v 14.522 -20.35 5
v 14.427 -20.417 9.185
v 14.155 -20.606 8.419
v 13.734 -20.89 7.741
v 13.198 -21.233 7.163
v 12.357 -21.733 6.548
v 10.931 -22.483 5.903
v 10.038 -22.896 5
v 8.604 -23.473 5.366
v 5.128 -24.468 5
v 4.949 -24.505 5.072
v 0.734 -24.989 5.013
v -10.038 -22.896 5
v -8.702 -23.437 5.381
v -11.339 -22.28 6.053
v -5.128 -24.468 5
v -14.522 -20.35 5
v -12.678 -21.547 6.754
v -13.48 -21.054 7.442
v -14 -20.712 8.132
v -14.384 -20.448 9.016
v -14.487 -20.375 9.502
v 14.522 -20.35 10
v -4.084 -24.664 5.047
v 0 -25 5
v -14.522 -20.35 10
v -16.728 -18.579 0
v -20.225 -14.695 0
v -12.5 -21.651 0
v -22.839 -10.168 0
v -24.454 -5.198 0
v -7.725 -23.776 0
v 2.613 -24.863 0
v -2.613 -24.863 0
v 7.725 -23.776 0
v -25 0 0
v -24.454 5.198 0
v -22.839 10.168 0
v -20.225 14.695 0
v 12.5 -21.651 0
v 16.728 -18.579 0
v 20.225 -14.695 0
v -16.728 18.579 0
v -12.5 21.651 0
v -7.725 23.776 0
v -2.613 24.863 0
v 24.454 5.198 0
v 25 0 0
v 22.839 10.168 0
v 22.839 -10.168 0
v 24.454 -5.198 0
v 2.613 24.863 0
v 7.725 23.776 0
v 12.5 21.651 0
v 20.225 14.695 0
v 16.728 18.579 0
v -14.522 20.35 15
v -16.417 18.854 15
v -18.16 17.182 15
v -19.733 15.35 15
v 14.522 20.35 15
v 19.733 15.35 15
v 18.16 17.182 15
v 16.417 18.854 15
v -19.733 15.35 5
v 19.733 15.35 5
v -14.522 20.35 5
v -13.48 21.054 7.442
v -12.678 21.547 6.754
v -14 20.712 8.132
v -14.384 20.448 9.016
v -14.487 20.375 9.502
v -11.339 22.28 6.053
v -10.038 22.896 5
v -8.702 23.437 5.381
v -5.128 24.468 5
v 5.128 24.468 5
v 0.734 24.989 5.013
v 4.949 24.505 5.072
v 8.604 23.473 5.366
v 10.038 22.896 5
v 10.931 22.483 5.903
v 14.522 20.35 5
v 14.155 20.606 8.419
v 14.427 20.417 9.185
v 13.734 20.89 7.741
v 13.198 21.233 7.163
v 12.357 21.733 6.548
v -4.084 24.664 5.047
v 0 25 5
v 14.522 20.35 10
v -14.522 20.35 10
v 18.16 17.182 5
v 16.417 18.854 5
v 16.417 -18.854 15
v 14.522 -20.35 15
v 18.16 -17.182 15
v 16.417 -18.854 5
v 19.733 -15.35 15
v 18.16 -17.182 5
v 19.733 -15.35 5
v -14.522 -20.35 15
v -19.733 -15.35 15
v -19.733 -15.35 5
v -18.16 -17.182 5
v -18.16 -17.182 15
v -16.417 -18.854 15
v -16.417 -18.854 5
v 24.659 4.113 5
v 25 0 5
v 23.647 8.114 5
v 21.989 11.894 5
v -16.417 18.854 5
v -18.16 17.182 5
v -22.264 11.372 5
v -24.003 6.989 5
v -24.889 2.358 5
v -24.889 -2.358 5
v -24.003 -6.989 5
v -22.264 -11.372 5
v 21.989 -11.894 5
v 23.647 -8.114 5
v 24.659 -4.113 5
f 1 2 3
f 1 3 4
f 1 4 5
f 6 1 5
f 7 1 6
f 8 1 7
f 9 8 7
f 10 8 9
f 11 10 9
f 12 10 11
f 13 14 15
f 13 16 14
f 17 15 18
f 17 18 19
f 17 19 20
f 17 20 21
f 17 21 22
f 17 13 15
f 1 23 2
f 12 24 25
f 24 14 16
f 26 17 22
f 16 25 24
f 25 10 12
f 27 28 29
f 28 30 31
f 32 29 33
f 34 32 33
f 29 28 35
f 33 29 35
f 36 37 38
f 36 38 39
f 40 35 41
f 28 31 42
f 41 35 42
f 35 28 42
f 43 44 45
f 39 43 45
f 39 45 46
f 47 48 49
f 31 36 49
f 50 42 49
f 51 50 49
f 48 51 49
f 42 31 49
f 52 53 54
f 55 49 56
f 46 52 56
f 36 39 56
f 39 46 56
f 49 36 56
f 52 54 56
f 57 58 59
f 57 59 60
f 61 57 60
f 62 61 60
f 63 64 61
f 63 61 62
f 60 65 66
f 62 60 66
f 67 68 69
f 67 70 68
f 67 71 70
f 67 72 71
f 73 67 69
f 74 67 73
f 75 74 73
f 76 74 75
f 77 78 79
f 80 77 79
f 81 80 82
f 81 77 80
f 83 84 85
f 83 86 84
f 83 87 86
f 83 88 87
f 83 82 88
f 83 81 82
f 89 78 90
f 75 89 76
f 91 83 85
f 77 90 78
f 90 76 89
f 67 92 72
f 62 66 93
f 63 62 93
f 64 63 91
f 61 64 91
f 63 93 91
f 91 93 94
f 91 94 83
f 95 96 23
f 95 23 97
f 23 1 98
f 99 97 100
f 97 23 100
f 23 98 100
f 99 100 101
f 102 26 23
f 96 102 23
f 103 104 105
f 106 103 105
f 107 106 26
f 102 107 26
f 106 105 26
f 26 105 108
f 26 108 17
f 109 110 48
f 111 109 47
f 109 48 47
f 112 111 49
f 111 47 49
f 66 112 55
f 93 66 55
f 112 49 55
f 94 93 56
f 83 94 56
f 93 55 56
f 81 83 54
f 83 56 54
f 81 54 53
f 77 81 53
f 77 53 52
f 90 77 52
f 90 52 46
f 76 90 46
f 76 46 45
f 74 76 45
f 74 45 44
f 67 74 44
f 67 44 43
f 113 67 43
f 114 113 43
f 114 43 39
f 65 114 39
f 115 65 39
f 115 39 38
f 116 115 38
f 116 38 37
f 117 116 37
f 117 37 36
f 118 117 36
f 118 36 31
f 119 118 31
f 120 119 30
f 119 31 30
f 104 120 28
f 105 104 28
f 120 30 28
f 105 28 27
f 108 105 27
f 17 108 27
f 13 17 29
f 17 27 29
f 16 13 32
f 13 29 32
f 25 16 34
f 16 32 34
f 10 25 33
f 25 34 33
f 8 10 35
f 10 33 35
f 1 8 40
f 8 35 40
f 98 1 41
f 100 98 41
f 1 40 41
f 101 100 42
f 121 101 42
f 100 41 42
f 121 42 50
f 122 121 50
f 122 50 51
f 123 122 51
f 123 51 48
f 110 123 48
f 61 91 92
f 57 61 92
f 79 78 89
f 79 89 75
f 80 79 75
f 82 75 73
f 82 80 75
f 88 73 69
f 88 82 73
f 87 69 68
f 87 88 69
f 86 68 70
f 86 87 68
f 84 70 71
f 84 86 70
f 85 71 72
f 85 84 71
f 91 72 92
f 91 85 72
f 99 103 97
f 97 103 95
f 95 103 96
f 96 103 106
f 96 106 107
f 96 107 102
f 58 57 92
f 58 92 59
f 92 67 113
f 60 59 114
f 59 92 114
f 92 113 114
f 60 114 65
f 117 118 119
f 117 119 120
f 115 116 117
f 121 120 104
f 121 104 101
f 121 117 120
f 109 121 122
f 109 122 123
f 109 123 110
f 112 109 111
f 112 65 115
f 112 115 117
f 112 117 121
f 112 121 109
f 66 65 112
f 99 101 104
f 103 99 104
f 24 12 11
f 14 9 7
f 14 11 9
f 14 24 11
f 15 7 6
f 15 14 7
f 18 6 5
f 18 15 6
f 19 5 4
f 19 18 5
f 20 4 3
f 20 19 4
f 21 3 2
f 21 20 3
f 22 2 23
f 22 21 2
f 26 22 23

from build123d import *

# Parameters (mm, degrees)
ESQUISSE1_R        = 25
BOSS_EXTRU_1_DEPTH = 5
BOSS_EXTRU_2_DEPTH = 10
CONG_2_R           = 5


with BuildPart() as part:
    # Esquisse1 → Boss.-Extru.1 (new body)
    with BuildSketch(Plane.XY):
        Circle(ESQUISSE1_R)
    extrude(amount=BOSS_EXTRU_1_DEPTH)

    # Esquisse2 → Boss.-Extru.2 (add)
    with BuildSketch(Plane.XY.offset(5)):
        with BuildLine():
            Line((-19.732650608, 15.35), (19.732650608, 15.35))
            ThreePointArc((19.732650608, 15.35), (17.308633531, 18.039157555), (14.52162181, 20.35))
            Line((14.52162181, 20.35), (-14.52162181, 20.35))
            ThreePointArc((-14.52162181, 20.35), (-17.308633531, 18.039157555), (-19.732650608, 15.35))
        make_face()
        with BuildLine():
            Line((-14.52162181, -20.35), (14.52162181, -20.35))
            ThreePointArc((14.52162181, -20.35), (17.308633531, -18.039157555), (19.732650608, -15.35))
            Line((19.732650608, -15.35), (-19.732650608, -15.35))
            ThreePointArc((-19.732650608, -15.35), (-17.308633531, -18.039157555), (-14.52162181, -20.35))
        make_face()
    extrude(amount=BOSS_EXTRU_2_DEPTH)

    # Congé2
    # the kernel refuses this fillet: 5 mm, written as the material it adds along each edge
    with BuildSketch(Plane(origin=(27.02162181, 20.35, 5), x_dir=(0, 1, 0), z_dir=(-1, 0, 0))) as cong_2_piece_1_section:
        with BuildLine():
            CenterArc((CONG_2_R, -CONG_2_R), CONG_2_R, 90, 90)
            Line((0, -CONG_2_R), (0, 0))
            Line((0, 0), (CONG_2_R, 0))
        make_face()
    cong_2_piece_1 = extrude(amount=54.043243621, mode=Mode.PRIVATE)
    cong_2_piece_1 = cong_2_piece_1 & Plane(origin=(0, 0, 6.238001242), x_dir=(1, 0, 0), z_dir=(0, 0, -1)) * Cylinder(25, 129, mode=Mode.PRIVATE)
    add(cong_2_piece_1)
    with BuildSketch(Plane(origin=(-27.02162181, -20.35, 5), x_dir=(0, -1, 0), z_dir=(1, 0, 0))) as cong_2_piece_2_section:
        with BuildLine():
            CenterArc((CONG_2_R, -CONG_2_R), CONG_2_R, 90, 90)
            Line((0, -CONG_2_R), (0, 0))
            Line((0, 0), (CONG_2_R, 0))
        make_face()
    cong_2_piece_2 = extrude(amount=54.043243621, mode=Mode.PRIVATE)
    cong_2_piece_2 = cong_2_piece_2 & Plane(origin=(0, 0, 6.238012691), x_dir=(1, 0, 0), z_dir=(0, 0, -1)) * Cylinder(25, 129, mode=Mode.PRIVATE)
    add(cong_2_piece_2)


solid = part.part
